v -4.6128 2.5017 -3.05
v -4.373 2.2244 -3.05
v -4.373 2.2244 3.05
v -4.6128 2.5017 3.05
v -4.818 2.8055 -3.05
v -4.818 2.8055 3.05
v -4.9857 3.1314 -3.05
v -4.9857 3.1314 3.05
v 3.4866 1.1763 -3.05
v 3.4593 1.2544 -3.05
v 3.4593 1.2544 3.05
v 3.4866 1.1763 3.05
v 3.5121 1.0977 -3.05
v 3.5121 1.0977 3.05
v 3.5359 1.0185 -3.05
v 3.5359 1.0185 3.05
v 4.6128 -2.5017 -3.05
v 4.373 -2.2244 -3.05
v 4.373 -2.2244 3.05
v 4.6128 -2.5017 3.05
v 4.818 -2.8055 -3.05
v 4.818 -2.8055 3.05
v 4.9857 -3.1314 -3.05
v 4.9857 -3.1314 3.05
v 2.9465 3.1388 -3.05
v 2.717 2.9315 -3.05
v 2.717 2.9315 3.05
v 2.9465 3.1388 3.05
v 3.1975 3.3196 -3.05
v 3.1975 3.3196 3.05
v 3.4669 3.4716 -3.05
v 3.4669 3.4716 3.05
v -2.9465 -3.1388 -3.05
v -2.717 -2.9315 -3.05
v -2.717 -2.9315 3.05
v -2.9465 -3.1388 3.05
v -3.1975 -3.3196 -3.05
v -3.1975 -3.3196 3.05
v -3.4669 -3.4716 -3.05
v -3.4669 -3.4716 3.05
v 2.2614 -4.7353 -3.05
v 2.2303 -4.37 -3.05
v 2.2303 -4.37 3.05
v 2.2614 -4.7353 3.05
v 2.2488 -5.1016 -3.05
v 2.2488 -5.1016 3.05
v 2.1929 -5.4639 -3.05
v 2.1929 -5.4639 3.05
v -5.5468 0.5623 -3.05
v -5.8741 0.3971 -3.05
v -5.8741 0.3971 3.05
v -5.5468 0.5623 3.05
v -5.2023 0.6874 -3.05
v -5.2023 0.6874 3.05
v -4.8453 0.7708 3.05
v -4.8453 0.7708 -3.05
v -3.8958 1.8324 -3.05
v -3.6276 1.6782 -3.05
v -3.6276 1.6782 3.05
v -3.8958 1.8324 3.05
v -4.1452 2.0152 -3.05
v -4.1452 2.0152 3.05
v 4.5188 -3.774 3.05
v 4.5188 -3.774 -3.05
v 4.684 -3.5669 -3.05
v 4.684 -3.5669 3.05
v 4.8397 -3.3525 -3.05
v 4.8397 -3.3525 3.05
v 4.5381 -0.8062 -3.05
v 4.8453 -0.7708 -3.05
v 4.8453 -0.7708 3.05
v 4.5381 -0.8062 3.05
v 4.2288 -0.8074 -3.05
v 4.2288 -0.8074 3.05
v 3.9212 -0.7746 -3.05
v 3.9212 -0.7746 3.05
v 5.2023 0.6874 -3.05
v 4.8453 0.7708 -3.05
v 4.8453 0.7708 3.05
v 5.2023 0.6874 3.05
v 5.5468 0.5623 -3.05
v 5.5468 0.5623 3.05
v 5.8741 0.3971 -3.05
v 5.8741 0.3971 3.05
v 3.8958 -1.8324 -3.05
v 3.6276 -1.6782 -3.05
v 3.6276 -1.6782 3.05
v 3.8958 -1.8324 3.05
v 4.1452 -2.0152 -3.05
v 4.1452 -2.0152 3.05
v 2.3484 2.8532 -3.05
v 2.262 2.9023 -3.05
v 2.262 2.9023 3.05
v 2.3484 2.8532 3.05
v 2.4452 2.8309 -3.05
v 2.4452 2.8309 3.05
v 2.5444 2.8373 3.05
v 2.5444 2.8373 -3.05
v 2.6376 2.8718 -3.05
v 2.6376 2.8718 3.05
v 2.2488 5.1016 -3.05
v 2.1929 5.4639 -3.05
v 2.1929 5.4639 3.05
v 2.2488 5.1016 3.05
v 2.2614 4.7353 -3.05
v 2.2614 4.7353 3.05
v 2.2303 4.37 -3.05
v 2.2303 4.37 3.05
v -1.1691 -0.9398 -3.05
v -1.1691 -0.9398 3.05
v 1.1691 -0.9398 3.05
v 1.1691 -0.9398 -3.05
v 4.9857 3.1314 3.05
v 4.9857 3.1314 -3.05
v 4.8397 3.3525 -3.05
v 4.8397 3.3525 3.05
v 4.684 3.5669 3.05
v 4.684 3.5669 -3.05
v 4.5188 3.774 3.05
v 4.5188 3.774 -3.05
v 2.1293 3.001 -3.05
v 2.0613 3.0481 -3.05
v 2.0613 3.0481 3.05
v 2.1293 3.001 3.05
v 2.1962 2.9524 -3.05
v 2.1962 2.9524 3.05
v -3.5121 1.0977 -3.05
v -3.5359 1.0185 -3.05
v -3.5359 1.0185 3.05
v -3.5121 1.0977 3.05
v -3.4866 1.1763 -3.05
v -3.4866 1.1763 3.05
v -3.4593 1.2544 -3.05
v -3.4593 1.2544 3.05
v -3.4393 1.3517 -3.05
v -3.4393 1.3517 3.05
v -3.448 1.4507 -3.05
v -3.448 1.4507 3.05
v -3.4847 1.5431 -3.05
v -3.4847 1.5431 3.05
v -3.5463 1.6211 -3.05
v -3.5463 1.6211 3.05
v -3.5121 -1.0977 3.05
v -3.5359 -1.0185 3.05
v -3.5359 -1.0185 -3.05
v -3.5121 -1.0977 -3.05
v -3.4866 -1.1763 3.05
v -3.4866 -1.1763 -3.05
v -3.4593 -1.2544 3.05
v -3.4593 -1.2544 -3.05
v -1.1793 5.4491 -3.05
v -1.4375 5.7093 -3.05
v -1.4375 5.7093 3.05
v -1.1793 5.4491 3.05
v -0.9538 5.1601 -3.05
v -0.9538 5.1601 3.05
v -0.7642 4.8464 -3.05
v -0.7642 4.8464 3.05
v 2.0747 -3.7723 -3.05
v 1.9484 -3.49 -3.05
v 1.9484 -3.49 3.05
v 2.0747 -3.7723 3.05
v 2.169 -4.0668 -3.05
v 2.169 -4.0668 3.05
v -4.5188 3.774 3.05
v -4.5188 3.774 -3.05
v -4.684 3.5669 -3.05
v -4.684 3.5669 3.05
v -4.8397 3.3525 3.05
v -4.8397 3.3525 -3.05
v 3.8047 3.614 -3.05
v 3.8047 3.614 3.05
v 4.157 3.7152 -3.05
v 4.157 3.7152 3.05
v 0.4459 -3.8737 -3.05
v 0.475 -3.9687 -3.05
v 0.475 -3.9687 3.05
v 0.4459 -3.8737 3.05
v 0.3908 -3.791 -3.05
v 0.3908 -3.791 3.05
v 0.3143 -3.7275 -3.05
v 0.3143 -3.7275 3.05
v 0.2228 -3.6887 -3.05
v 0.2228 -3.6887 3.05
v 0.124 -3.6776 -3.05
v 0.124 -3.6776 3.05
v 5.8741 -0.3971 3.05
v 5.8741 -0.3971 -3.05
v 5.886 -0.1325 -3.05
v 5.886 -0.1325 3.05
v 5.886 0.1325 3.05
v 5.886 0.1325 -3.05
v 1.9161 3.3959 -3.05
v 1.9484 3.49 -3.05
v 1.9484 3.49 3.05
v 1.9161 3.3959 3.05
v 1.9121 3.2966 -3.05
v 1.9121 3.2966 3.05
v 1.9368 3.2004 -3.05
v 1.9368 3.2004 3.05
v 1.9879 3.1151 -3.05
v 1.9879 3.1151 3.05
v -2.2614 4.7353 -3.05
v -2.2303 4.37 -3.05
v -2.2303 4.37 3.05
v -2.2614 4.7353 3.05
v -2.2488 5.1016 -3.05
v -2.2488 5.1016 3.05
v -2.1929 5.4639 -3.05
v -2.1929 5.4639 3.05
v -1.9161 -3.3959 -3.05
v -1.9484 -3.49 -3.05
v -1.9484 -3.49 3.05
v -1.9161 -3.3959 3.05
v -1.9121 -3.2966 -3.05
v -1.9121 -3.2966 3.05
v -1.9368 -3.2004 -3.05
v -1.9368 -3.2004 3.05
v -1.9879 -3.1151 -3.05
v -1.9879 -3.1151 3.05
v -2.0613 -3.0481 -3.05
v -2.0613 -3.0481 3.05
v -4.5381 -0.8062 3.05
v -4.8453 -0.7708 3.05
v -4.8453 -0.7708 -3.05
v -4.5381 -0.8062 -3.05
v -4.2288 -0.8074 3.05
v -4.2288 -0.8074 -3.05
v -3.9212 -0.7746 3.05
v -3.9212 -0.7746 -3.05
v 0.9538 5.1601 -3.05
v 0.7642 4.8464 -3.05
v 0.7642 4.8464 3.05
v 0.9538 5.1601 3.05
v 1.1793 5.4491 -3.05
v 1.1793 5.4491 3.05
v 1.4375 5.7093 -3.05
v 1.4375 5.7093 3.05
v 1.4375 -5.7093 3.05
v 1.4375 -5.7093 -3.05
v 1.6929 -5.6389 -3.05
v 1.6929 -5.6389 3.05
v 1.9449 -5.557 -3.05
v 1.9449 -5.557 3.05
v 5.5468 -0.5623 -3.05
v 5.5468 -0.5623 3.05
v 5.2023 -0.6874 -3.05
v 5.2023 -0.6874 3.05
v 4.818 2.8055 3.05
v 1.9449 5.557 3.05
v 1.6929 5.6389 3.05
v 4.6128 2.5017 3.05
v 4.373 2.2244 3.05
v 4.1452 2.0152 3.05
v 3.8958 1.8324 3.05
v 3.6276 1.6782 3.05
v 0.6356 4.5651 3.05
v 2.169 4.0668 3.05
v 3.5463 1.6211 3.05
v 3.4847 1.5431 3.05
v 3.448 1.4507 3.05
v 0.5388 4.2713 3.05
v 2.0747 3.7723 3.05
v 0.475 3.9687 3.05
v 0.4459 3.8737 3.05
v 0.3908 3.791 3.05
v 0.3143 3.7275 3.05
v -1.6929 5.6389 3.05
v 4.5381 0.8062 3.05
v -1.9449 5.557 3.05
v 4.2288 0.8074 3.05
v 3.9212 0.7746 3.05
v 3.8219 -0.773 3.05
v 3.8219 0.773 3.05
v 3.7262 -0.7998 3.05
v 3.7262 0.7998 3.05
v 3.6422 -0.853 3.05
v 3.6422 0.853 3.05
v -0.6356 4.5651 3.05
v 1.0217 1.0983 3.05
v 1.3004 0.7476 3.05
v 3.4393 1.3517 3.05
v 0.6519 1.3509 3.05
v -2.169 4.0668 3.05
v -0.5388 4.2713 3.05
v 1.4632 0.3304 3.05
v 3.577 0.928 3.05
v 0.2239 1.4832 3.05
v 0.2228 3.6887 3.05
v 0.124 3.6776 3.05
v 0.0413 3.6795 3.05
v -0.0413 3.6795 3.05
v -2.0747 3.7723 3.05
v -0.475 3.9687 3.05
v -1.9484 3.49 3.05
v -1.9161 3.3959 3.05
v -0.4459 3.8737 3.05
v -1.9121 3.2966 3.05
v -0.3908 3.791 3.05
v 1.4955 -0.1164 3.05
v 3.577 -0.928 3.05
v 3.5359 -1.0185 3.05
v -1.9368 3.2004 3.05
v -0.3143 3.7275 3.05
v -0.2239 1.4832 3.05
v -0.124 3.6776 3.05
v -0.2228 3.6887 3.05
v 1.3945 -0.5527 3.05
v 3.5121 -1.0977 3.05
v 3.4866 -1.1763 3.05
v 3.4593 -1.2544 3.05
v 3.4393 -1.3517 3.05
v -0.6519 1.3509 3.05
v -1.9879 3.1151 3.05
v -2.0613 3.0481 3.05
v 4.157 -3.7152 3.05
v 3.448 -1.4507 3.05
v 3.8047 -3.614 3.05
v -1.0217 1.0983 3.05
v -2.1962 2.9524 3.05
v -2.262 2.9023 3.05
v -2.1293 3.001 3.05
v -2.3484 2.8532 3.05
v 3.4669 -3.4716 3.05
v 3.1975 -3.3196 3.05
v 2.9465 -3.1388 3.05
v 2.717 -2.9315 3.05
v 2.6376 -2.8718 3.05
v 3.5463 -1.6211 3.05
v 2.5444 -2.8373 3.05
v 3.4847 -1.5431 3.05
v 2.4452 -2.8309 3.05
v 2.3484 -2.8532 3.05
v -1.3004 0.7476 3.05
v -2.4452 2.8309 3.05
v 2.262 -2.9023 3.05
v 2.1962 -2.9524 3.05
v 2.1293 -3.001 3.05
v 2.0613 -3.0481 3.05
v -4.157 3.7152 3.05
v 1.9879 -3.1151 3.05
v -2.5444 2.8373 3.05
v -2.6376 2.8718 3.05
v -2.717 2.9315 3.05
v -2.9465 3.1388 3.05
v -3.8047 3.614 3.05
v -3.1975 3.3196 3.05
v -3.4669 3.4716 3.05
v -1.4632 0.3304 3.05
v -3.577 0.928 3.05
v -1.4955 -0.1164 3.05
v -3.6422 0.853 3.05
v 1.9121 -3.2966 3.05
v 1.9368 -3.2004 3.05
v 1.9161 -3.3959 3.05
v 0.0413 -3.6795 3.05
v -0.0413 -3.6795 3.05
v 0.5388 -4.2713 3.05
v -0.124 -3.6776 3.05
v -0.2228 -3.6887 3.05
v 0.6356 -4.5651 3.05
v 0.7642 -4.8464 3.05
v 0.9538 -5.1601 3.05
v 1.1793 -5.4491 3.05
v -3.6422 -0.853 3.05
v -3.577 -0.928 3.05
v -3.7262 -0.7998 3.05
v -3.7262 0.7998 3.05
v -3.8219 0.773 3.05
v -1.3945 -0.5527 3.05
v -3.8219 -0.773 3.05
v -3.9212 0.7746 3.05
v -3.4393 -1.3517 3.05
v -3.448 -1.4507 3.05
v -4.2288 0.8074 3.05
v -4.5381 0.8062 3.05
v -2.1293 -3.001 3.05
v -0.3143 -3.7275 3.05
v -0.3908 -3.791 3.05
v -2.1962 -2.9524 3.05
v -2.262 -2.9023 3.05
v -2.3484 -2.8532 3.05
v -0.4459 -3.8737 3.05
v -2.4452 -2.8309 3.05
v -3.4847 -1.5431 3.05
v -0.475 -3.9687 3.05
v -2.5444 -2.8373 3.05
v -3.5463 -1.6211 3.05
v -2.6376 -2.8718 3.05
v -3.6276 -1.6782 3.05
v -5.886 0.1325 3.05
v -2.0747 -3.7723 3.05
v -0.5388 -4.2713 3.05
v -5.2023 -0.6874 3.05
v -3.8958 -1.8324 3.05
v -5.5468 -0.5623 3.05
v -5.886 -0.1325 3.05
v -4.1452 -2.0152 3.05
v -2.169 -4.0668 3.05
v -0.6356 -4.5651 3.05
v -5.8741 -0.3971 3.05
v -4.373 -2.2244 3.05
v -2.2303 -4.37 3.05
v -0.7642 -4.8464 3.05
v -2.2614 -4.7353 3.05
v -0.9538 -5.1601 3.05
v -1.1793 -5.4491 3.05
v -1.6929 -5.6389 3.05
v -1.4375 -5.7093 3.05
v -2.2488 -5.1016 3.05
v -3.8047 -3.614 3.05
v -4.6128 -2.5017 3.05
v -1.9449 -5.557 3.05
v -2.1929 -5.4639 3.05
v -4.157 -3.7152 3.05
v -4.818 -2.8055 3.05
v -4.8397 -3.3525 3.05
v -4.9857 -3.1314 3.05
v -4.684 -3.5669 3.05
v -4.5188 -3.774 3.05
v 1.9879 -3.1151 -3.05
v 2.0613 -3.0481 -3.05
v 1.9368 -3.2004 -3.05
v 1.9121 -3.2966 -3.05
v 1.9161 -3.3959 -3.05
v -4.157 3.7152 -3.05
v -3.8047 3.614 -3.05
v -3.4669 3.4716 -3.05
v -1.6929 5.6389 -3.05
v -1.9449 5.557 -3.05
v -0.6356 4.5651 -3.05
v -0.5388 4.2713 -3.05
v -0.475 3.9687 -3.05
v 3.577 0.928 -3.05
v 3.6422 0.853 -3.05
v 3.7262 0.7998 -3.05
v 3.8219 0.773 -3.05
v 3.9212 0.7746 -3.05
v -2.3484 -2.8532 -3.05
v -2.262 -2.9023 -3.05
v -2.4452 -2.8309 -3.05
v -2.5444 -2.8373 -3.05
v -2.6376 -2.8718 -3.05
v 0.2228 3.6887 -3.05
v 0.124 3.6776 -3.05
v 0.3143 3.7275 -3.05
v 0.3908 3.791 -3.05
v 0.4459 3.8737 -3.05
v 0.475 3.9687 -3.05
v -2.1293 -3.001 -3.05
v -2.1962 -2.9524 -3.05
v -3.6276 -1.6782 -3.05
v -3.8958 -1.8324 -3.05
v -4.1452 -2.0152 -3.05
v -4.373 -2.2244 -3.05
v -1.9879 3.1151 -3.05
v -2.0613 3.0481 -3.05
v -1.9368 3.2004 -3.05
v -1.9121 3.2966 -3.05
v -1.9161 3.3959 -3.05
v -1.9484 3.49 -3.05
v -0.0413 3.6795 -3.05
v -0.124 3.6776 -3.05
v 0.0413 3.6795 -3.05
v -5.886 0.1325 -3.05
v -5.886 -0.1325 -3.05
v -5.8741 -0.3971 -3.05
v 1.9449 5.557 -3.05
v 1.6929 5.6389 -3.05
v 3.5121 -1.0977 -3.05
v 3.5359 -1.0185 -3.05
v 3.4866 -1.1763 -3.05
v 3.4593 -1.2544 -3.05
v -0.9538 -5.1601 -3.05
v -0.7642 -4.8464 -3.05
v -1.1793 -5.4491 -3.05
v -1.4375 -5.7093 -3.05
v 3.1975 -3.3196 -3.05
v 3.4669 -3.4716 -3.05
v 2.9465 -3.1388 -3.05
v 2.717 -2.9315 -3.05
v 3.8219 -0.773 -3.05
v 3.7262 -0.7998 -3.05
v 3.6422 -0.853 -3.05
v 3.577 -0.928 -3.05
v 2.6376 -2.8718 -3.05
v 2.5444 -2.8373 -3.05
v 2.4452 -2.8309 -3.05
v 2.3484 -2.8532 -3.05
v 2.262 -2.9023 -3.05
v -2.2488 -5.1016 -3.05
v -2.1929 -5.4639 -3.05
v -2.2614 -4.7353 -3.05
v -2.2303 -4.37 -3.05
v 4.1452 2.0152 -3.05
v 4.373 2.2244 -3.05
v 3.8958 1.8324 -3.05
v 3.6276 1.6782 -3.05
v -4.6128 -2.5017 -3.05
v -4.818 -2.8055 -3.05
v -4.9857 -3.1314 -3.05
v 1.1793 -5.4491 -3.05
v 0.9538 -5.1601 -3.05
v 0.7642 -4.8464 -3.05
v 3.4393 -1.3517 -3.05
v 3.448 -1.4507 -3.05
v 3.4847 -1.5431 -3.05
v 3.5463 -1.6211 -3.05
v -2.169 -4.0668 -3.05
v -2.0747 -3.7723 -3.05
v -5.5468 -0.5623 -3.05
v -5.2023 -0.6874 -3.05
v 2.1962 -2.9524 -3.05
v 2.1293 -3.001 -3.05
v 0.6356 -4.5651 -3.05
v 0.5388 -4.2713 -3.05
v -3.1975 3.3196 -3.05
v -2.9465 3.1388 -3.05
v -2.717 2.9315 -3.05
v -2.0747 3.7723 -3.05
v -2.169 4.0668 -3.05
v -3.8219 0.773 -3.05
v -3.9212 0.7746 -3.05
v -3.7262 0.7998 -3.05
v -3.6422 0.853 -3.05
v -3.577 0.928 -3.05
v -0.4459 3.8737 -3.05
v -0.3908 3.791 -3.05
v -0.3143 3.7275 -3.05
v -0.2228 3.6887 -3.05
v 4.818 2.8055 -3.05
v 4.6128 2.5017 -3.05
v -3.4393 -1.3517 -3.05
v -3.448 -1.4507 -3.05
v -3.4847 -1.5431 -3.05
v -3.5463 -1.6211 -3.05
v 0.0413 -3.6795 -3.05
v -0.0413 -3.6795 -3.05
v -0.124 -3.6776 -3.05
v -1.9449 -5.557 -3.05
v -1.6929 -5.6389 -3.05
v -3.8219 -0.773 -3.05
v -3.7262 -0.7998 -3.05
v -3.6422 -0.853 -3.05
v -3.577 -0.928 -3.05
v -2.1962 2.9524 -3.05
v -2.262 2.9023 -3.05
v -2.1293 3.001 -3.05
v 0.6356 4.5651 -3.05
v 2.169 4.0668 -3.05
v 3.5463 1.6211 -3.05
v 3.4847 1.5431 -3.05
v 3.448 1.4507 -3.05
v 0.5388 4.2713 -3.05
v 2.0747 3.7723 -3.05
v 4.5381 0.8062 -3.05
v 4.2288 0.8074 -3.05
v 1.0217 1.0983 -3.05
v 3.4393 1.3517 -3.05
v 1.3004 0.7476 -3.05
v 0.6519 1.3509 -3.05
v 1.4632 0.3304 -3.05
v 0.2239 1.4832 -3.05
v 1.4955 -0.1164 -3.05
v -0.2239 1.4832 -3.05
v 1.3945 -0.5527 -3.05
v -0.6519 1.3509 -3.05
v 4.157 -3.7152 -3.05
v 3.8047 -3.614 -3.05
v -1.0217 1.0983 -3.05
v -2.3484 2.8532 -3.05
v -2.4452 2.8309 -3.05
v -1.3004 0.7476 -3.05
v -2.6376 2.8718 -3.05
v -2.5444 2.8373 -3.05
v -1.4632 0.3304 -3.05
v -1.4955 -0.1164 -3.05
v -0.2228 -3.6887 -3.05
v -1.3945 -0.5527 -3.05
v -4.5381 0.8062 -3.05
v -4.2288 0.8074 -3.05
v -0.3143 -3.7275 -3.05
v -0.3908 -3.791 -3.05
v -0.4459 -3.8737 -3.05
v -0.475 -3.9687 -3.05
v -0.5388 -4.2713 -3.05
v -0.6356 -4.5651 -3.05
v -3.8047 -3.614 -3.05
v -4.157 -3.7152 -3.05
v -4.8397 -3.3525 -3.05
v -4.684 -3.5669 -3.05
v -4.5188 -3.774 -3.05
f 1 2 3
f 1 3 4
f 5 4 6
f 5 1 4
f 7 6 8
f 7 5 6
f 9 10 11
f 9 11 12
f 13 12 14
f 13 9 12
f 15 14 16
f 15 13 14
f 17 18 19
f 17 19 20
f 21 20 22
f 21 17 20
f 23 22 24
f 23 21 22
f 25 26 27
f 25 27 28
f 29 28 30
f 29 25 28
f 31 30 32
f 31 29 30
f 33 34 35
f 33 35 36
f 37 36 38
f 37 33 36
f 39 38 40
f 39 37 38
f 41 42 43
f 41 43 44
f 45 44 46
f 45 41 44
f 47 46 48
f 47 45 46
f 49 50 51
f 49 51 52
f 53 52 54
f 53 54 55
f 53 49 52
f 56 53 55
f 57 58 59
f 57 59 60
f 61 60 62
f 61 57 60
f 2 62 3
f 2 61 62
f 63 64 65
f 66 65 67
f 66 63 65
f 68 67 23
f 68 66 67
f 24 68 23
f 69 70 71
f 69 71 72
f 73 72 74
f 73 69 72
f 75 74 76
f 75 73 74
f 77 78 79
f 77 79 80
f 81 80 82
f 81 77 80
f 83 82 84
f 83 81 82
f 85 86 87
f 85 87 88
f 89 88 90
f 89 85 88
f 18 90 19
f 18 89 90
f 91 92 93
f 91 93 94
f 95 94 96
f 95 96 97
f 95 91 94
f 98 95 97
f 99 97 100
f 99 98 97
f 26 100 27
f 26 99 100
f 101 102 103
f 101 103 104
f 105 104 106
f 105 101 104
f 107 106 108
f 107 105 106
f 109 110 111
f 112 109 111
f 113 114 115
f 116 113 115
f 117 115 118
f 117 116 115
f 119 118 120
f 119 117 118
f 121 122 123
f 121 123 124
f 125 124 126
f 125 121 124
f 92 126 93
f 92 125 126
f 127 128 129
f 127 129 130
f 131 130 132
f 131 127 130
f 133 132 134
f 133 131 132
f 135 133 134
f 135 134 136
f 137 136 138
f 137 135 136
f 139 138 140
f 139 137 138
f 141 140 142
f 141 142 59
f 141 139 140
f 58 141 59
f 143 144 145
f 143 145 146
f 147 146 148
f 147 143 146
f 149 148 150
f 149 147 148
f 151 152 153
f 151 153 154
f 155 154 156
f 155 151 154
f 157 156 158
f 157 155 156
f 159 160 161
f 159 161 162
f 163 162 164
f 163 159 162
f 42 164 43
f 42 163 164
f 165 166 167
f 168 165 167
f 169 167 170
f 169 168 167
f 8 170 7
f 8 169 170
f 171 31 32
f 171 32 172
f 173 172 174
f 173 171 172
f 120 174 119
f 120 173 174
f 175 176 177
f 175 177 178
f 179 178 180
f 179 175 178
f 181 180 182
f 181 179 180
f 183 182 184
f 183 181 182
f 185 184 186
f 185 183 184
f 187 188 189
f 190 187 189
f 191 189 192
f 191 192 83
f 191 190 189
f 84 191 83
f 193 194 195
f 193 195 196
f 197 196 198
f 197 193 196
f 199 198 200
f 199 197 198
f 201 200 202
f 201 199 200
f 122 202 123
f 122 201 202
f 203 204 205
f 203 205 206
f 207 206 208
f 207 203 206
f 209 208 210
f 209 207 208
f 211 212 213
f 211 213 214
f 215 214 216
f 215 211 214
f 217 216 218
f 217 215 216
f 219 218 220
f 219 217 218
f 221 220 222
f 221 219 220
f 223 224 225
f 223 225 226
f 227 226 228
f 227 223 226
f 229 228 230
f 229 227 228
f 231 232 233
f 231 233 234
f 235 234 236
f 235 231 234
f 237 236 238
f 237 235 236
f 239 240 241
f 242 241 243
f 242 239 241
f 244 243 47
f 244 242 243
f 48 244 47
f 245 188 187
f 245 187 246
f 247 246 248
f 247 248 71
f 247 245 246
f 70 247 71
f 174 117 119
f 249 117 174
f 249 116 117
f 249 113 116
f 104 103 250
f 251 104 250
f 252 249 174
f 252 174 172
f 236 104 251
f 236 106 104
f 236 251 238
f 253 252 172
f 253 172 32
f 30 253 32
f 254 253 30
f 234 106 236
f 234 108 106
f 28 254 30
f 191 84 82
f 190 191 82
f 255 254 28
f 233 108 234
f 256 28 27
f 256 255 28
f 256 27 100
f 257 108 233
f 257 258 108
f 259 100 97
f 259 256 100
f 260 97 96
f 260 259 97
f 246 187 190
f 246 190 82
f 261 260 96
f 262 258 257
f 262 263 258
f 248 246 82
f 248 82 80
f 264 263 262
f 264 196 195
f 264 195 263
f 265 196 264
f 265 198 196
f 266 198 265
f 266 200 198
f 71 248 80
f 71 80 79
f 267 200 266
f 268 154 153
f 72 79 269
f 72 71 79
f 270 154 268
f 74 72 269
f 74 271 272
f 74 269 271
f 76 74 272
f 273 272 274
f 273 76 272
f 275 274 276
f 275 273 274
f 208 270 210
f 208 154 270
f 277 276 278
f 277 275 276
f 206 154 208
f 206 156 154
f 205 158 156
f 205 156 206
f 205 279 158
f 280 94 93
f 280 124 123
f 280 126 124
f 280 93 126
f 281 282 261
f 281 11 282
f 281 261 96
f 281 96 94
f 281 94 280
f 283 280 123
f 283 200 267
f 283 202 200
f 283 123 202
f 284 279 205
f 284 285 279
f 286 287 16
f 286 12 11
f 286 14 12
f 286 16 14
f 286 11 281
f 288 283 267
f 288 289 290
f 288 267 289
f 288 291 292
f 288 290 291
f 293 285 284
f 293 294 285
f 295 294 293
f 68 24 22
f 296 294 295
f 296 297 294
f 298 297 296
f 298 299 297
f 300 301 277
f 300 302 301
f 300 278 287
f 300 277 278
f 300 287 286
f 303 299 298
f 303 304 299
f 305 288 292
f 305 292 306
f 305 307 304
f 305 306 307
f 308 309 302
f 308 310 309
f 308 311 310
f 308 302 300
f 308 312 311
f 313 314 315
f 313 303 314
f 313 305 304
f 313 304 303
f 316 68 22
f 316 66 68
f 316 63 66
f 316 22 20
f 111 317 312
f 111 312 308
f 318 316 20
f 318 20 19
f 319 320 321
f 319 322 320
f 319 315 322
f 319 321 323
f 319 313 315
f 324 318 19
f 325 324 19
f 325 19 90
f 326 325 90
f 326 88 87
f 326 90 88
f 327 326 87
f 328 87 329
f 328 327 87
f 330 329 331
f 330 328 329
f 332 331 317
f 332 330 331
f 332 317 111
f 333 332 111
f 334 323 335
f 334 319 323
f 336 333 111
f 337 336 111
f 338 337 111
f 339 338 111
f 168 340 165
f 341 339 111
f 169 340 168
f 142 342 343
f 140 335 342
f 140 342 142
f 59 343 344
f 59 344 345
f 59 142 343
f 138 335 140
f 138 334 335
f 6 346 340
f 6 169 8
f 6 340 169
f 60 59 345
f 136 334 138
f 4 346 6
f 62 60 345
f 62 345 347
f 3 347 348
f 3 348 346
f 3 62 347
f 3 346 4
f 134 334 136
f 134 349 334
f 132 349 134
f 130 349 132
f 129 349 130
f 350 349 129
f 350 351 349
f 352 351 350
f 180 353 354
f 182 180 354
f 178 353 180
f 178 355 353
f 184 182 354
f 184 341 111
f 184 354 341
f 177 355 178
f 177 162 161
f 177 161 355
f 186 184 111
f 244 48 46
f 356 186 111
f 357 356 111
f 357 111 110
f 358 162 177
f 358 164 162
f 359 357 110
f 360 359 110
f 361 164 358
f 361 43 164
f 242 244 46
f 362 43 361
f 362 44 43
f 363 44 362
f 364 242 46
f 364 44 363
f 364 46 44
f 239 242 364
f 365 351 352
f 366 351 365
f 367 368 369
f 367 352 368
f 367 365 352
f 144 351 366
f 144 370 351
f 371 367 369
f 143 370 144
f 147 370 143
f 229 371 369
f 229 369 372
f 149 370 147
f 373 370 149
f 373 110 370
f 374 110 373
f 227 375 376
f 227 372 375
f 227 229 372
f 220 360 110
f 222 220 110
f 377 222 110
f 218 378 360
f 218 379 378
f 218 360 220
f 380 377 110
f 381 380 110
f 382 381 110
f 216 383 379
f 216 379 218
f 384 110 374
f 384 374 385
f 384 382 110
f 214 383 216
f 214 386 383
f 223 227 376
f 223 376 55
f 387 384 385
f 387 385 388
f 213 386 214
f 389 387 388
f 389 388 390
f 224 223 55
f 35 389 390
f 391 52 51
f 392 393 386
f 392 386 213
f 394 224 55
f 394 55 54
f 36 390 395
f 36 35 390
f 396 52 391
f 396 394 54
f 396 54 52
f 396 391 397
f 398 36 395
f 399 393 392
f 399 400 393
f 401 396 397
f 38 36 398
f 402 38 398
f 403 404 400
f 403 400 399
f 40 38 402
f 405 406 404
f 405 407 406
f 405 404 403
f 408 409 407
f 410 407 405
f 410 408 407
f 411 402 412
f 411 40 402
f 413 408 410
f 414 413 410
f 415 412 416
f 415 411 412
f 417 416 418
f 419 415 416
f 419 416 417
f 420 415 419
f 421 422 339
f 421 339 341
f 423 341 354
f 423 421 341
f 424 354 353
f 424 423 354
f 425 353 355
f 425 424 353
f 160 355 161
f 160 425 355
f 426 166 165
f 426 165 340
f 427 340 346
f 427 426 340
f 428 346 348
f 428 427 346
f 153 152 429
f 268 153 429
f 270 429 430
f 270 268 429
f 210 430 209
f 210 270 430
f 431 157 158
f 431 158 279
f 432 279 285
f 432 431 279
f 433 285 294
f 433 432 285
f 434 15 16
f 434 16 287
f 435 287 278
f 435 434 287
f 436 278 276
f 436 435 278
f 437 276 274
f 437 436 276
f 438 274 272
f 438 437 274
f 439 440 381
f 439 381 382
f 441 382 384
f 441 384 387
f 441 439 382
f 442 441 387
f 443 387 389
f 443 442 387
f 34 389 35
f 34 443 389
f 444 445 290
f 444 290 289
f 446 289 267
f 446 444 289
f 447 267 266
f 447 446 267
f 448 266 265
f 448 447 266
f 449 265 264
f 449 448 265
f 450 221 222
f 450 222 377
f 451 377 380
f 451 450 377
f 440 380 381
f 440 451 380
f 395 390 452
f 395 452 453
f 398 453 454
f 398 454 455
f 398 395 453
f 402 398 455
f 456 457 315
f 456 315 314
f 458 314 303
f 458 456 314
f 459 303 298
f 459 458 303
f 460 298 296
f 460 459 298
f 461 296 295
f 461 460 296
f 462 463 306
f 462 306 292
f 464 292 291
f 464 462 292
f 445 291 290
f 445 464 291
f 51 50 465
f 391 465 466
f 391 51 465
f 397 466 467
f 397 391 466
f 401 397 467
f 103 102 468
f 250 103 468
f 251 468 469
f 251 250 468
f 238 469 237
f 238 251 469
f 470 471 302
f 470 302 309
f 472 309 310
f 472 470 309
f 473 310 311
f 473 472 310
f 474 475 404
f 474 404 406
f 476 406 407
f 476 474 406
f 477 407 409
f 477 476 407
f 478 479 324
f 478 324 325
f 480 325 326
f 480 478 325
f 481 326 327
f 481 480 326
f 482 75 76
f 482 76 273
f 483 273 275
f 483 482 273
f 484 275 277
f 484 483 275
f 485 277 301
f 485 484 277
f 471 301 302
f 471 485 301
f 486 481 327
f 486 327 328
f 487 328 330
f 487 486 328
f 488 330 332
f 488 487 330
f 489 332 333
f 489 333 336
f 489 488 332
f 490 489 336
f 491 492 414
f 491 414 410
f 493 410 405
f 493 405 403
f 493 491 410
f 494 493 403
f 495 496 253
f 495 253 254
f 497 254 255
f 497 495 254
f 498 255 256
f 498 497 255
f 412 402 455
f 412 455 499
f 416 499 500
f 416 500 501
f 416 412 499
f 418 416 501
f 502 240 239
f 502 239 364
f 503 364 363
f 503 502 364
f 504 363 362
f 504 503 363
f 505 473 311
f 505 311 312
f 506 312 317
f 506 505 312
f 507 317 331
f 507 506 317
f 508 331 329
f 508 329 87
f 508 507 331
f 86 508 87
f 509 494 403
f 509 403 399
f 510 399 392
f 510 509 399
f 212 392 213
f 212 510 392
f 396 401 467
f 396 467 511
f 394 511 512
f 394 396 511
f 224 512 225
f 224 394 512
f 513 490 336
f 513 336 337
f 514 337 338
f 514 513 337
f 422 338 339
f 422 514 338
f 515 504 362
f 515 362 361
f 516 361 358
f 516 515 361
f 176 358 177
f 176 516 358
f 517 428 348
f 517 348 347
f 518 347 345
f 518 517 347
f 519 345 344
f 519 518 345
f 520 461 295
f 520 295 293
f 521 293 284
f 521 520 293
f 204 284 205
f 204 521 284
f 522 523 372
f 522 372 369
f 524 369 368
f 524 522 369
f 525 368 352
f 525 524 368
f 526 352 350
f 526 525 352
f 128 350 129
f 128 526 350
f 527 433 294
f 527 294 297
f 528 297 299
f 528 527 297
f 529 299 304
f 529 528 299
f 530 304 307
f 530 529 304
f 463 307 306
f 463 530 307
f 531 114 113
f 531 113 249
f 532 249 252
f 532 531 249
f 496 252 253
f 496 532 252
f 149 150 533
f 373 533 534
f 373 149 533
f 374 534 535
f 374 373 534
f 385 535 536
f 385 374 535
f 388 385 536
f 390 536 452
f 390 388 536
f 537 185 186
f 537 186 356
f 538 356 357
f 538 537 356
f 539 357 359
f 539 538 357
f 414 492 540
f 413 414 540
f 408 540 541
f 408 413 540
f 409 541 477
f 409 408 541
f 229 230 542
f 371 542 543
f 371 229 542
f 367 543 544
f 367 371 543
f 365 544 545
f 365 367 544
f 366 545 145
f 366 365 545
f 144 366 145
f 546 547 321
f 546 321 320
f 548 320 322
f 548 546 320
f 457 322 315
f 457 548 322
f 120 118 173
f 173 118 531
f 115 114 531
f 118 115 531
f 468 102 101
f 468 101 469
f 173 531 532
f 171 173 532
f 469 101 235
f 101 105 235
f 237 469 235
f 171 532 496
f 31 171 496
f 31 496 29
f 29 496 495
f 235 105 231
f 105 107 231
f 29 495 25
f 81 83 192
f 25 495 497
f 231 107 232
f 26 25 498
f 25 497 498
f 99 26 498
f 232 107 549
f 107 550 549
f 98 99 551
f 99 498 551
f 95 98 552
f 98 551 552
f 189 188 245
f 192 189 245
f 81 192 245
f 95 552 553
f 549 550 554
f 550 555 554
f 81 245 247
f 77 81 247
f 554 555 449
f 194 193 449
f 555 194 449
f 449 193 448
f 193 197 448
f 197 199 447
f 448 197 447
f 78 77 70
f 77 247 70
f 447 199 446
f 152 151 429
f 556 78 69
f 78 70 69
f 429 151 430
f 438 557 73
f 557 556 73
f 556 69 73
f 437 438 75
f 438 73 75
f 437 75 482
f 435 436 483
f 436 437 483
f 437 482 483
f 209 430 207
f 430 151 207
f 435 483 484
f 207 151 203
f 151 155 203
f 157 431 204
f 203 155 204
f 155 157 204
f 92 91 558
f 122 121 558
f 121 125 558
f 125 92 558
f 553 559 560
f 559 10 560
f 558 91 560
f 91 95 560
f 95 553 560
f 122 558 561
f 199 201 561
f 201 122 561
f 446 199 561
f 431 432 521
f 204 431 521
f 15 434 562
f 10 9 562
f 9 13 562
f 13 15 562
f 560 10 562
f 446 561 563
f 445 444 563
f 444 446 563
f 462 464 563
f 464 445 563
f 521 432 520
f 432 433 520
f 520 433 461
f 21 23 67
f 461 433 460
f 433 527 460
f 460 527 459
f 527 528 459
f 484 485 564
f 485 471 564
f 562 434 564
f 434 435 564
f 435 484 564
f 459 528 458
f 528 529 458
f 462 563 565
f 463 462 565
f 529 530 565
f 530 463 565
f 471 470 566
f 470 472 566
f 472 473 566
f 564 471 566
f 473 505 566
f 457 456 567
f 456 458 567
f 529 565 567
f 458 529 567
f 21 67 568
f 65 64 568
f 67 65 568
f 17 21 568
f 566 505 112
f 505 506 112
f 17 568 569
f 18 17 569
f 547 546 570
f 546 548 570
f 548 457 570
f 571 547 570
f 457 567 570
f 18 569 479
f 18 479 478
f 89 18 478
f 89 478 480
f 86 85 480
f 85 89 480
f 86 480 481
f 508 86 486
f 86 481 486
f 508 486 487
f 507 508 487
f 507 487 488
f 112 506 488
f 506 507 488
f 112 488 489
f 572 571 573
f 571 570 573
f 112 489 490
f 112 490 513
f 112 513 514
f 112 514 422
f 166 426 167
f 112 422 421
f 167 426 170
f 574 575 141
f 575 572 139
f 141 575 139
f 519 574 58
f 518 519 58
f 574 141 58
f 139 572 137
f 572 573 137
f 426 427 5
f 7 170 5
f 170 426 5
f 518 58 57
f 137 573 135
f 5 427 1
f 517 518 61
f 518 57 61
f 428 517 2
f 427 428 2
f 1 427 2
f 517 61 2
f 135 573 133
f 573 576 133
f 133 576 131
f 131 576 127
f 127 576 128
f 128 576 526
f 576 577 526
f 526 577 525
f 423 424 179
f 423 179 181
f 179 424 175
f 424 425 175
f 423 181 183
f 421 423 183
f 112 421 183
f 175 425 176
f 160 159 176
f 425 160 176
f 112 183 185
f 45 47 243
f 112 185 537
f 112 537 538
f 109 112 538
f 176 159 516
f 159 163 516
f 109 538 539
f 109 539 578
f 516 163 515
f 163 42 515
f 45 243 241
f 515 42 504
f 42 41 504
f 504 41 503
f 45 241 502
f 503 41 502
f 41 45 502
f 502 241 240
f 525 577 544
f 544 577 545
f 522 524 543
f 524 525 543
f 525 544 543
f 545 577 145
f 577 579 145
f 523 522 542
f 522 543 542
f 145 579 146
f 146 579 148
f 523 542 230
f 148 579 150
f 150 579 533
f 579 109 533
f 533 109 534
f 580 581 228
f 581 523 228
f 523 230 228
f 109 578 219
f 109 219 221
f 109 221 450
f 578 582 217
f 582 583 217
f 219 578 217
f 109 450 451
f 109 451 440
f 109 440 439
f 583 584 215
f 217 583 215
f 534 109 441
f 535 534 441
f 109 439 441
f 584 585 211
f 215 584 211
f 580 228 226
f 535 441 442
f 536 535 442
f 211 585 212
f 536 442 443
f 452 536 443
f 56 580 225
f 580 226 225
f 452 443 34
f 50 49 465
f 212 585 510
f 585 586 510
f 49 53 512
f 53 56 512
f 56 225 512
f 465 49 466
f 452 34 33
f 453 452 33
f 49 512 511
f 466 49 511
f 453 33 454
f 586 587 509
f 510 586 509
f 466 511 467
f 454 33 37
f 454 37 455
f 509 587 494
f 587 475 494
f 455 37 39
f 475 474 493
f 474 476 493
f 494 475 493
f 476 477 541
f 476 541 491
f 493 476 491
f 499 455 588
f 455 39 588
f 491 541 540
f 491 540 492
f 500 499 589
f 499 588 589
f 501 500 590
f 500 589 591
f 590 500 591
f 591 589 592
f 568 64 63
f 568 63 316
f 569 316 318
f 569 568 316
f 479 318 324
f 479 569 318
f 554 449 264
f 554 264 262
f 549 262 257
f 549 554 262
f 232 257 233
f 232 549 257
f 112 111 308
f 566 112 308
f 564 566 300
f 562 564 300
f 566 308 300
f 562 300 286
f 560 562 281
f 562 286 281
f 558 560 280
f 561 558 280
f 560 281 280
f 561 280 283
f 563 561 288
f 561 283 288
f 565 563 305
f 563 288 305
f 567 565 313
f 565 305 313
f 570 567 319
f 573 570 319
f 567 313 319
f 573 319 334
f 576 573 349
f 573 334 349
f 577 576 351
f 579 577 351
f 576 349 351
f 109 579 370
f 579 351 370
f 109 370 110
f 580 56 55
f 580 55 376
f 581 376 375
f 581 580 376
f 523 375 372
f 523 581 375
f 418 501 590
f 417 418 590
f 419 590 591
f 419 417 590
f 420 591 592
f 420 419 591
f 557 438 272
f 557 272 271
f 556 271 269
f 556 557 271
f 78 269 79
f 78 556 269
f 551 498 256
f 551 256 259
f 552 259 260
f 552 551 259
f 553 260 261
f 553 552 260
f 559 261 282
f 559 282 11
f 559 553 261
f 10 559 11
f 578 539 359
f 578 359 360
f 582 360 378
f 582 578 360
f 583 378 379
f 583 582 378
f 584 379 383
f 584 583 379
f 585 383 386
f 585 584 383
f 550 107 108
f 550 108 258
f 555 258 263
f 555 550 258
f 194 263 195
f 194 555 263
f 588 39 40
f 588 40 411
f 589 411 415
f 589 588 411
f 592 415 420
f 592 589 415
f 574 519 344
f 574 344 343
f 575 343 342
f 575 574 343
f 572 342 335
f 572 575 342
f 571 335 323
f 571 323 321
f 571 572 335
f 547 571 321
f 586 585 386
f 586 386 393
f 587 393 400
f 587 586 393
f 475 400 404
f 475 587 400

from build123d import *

# Parameters (mm, degrees)
SKETCH1_R                = 5.887500036
BLANK_DISK_DEPTH         = 3.05
GEAR_TOOTH_CUT_DEPTH     = 11.321594513
GEAR_START               = -3.049999996
GEAR_TEETH_REVOLVE_DEPTH = 6.099999992
HUB_EXTRUDE_DEPTH        = 11.221001367


# Read off the part's stored shape, not the designer's step: GEAR TEETH REVOLVE
with BuildPart() as part:
    # Sketch1 → BLANK DISK (new, symmetric)
    with BuildSketch(Plane.XY):
        with Locations(Location((0, 0, 0), (0, 0, 180))):
            Circle(SKETCH1_R)
    extrude(amount=BLANK_DISK_DEPTH, both=True)

    # Sketch2 → GEAR TOOTH CUT (cut, through all)
    with BuildSketch(Plane.XY.offset(3.049999996)):
        with BuildLine():
            ThreePointArc((-4.985659759, -3.131429935), (-5.599345274, -1.819337566), (-5.874091808, -0.397117245))
            ThreePointArc((-5.874091808, -0.397117245), (-5.376423722, -0.629962338), (-4.845327653, -0.77077188))
            ThreePointArc((-4.845327653, -0.77077188), (-4.383437981, -0.811075473), (-3.921230969, -0.774590865))
            ThreePointArc((-3.921230969, -0.774590865), (-3.682257583, -0.823363871), (-3.535926696, -1.018490385))
            ThreePointArc((-3.535926696, -1.018490385), (-3.499590796, -1.137085978), (-3.459278416, -1.254389535))
            ThreePointArc((-3.459278416, -1.254389535), (-3.462970103, -1.498261339), (-3.627635579, -1.678184561))
            ThreePointArc((-3.627635579, -1.678184561), (-4.023014022, -1.920346358), (-4.373000758, -2.224444588))
            ThreePointArc((-4.373000758, -2.224444588), (-4.719900732, -2.650532337), (-4.985659759, -3.131429935))
        make_face()
    extrude(amount=-GEAR_TOOTH_CUT_DEPTH, mode=Mode.SUBTRACT)

    # GEAR TEETH REVOLVE outline → GEAR TEETH REVOLVE (cut)
    with BuildSketch(Plane.XY.offset(GEAR_START)):
        with BuildLine():
            ThreePointArc((-4.518820439, -3.773979135), (-3.460585694, -4.763087583), (-2.192875139, -5.463877313))
            ThreePointArc((-2.192875139, -5.463877313), (-2.260536085, -4.918613747), (-2.230336207, -4.369998828))
            ThreePointArc((-2.230336207, -4.369998828), (-2.125935444, -3.918261151), (-1.948406698, -3.489950524))
            ThreePointArc((-1.948406698, -3.489950524), (-1.920945745, -3.247601641), (-2.061303357, -3.048135288))
            ThreePointArc((-2.061303357, -3.048135288), (-2.162866059, -2.97692974), (-2.26197116, -2.902341595))
            ThreePointArc((-2.26197116, -2.902341595), (-2.495047822, -2.830492067), (-2.717049406, -2.931498908))
            ThreePointArc((-2.717049406, -2.931498908), (-3.069537619, -3.232694041), (-3.466904071, -3.471579687))
            ThreePointArc((-3.466904071, -3.471579687), (-3.979335588, -3.669832811), (-4.518820439, -3.773979135))
        make_face()
        with BuildLine():
            ThreePointArc((-1.437513252, -5.709309268), (0, -5.887500035), (1.437513252, -5.709309268))
            ThreePointArc((1.437513252, -5.709309268), (1.062276513, -5.307951883), (0.764240969, -4.846362048))
            ThreePointArc((0.764240969, -4.846362048), (0.583178216, -4.419533361), (0.475047319, -3.968674006))
            ThreePointArc((0.475047319, -3.968674006), (0.354814597, -3.756468498), (0.124019523, -3.677596963))
            ThreePointArc((0.124019523, -3.677596963), (0, -3.679687523), (-0.124019523, -3.677596963))
            ThreePointArc((-0.124019523, -3.677596963), (-0.354814597, -3.756468498), (-0.475047319, -3.968674006))
            ThreePointArc((-0.475047319, -3.968674006), (-0.583178216, -4.419533361), (-0.764240969, -4.846362048))
            ThreePointArc((-0.764240969, -4.846362048), (-1.062276513, -5.307951883), (-1.437513252, -5.709309268))
        make_face()
        with BuildLine():
            ThreePointArc((2.192875139, -5.463877313), (3.460585694, -4.763087583), (4.518820439, -3.773979135))
            ThreePointArc((4.518820439, -3.773979135), (3.979335588, -3.669832811), (3.466904071, -3.471579687))
            ThreePointArc((3.466904071, -3.471579687), (3.069537619, -3.232694041), (2.717049406, -2.931498908))
            ThreePointArc((2.717049406, -2.931498908), (2.495047822, -2.830492067), (2.26197116, -2.902341595))
            ThreePointArc((2.26197116, -2.902341595), (2.162866059, -2.97692974), (2.061303357, -3.048135288))
            ThreePointArc((2.061303357, -3.048135288), (1.920945745, -3.247601641), (1.948406698, -3.489950524))
            ThreePointArc((1.948406698, -3.489950524), (2.125935444, -3.918261151), (2.230336207, -4.369998828))
            ThreePointArc((2.230336207, -4.369998828), (2.260536085, -4.918613747), (2.192875139, -5.463877313))
        make_face()
        with BuildLine():
            ThreePointArc((4.985659759, -3.131429935), (5.599345274, -1.819337565), (5.874091808, -0.397117245))
            ThreePointArc((5.874091808, -0.397117245), (5.376423722, -0.629962338), (4.845327653, -0.77077188))
            ThreePointArc((4.845327653, -0.77077188), (4.383437981, -0.811075473), (3.921230969, -0.774590865))
            ThreePointArc((3.921230969, -0.774590865), (3.682257583, -0.823363871), (3.535926696, -1.018490385))
            ThreePointArc((3.535926696, -1.018490385), (3.499590796, -1.137085978), (3.459278416, -1.254389535))
            ThreePointArc((3.459278416, -1.254389535), (3.462970103, -1.498261338), (3.627635579, -1.678184561))
            ThreePointArc((3.627635579, -1.678184561), (4.023014022, -1.920346358), (4.373000758, -2.224444588))
            ThreePointArc((4.373000758, -2.224444588), (4.719900732, -2.650532336), (4.985659759, -3.131429935))
        make_face()
        with BuildLine():
            ThreePointArc((5.874091808, 0.397117245), (5.599345274, 1.819337566), (4.98565976, 3.131429935))
            ThreePointArc((4.98565976, 3.131429935), (4.719900732, 2.650532336), (4.373000758, 2.224444588))
            ThreePointArc((4.373000758, 2.224444588), (4.023014022, 1.920346358), (3.627635579, 1.678184561))
            ThreePointArc((3.627635579, 1.678184561), (3.462970103, 1.498261338), (3.459278416, 1.254389535))
            ThreePointArc((3.459278416, 1.254389535), (3.499590796, 1.137085978), (3.535926696, 1.018490385))
            ThreePointArc((3.535926696, 1.018490385), (3.682257583, 0.823363871), (3.921230969, 0.774590865))
            ThreePointArc((3.921230969, 0.774590865), (4.383437981, 0.811075473), (4.845327653, 0.77077188))
            ThreePointArc((4.845327653, 0.77077188), (5.376423722, 0.629962338), (5.874091808, 0.397117245))
        make_face()
        with BuildLine():
            ThreePointArc((4.51882044, 3.773979135), (3.460585695, 4.763087584), (2.192875139, 5.463877314))
            ThreePointArc((2.192875139, 5.463877314), (2.260536085, 4.918613747), (2.230336207, 4.369998828))
            ThreePointArc((2.230336207, 4.369998828), (2.125935444, 3.918261151), (1.948406698, 3.489950524))
            ThreePointArc((1.948406698, 3.489950524), (1.920945745, 3.247601641), (2.061303357, 3.048135288))
            ThreePointArc((2.061303357, 3.048135288), (2.162866059, 2.97692974), (2.26197116, 2.902341595))
            ThreePointArc((2.26197116, 2.902341595), (2.495047822, 2.830492067), (2.717049406, 2.931498908))
            ThreePointArc((2.717049406, 2.931498908), (3.069537619, 3.232694041), (3.466904071, 3.471579687))
            ThreePointArc((3.466904071, 3.471579687), (3.979335588, 3.669832811), (4.51882044, 3.773979135))
        make_face()
        with BuildLine():
            ThreePointArc((1.437513252, 5.709309269), (0, 5.887500037), (-1.437513252, 5.709309269))
            ThreePointArc((-1.437513252, 5.709309269), (-1.062276513, 5.307951883), (-0.764240969, 4.846362048))
            ThreePointArc((-0.764240969, 4.846362048), (-0.583178216, 4.419533361), (-0.475047319, 3.968674006))
            ThreePointArc((-0.475047319, 3.968674006), (-0.354814597, 3.756468498), (-0.124019523, 3.677596963))
            ThreePointArc((-0.124019523, 3.677596963), (0, 3.679687523), (0.124019523, 3.677596963))
            ThreePointArc((0.124019523, 3.677596963), (0.354814597, 3.756468498), (0.475047319, 3.968674006))
            ThreePointArc((0.475047319, 3.968674006), (0.583178216, 4.419533361), (0.764240969, 4.846362048))
            ThreePointArc((0.764240969, 4.846362048), (1.062276513, 5.307951883), (1.437513252, 5.709309269))
        make_face()
        with BuildLine():
            ThreePointArc((-2.192875139, 5.463877315), (-3.460585695, 4.763087584), (-4.51882044, 3.773979136))
            ThreePointArc((-4.51882044, 3.773979136), (-3.979335588, 3.669832811), (-3.466904071, 3.471579687))
            ThreePointArc((-3.466904071, 3.471579687), (-3.069537619, 3.232694041), (-2.717049406, 2.931498908))
            ThreePointArc((-2.717049406, 2.931498908), (-2.495047822, 2.830492067), (-2.26197116, 2.902341595))
            ThreePointArc((-2.26197116, 2.902341595), (-2.162866059, 2.97692974), (-2.061303357, 3.048135288))
            ThreePointArc((-2.061303357, 3.048135288), (-1.920945745, 3.247601641), (-1.948406698, 3.489950524))
            ThreePointArc((-1.948406698, 3.489950524), (-2.125935444, 3.918261151), (-2.230336207, 4.369998828))
            ThreePointArc((-2.230336207, 4.369998828), (-2.260536085, 4.918613747), (-2.192875139, 5.463877315))
        make_face()
        with BuildLine():
            ThreePointArc((-3.535926696, 1.018490385), (-3.499590796, 1.137085978), (-3.459278416, 1.254389535))
            ThreePointArc((-3.459278416, 1.254389535), (-3.462970103, 1.498261338), (-3.627635579, 1.678184561))
            ThreePointArc((-3.627635579, 1.678184561), (-4.023014022, 1.920346358), (-4.373000758, 2.224444588))
            ThreePointArc((-4.373000758, 2.224444588), (-4.719900732, 2.650532336), (-4.985659759, 3.131429935))
            ThreePointArc((-4.985659759, 3.131429935), (-5.599345274, 1.819337566), (-5.874091808, 0.397117245))
            ThreePointArc((-5.874091808, 0.397117245), (-5.376423722, 0.629962338), (-4.845327653, 0.77077188))
            ThreePointArc((-4.845327653, 0.77077188), (-4.383437981, 0.811075473), (-3.921230969, 0.774590865))
            ThreePointArc((-3.921230969, 0.774590865), (-3.682257583, 0.823363871), (-3.535926696, 1.018490385))
        make_face()
    extrude(amount=GEAR_TEETH_REVOLVE_DEPTH, mode=Mode.SUBTRACT)

    # Sketch3 → HUB EXTRUDE (cut, through all)
    with BuildSketch(Plane.XY.offset(3.049999996)):
        with BuildLine():
            Line((-1.169092, -0.9398), (1.169092, -0.9398))
            ThreePointArc((1.169092, -0.9398), (0, 1.500000048), (-1.169092, -0.9398))
        make_face()
    extrude(amount=-HUB_EXTRUDE_DEPTH, mode=Mode.SUBTRACT)


solid = part.part
